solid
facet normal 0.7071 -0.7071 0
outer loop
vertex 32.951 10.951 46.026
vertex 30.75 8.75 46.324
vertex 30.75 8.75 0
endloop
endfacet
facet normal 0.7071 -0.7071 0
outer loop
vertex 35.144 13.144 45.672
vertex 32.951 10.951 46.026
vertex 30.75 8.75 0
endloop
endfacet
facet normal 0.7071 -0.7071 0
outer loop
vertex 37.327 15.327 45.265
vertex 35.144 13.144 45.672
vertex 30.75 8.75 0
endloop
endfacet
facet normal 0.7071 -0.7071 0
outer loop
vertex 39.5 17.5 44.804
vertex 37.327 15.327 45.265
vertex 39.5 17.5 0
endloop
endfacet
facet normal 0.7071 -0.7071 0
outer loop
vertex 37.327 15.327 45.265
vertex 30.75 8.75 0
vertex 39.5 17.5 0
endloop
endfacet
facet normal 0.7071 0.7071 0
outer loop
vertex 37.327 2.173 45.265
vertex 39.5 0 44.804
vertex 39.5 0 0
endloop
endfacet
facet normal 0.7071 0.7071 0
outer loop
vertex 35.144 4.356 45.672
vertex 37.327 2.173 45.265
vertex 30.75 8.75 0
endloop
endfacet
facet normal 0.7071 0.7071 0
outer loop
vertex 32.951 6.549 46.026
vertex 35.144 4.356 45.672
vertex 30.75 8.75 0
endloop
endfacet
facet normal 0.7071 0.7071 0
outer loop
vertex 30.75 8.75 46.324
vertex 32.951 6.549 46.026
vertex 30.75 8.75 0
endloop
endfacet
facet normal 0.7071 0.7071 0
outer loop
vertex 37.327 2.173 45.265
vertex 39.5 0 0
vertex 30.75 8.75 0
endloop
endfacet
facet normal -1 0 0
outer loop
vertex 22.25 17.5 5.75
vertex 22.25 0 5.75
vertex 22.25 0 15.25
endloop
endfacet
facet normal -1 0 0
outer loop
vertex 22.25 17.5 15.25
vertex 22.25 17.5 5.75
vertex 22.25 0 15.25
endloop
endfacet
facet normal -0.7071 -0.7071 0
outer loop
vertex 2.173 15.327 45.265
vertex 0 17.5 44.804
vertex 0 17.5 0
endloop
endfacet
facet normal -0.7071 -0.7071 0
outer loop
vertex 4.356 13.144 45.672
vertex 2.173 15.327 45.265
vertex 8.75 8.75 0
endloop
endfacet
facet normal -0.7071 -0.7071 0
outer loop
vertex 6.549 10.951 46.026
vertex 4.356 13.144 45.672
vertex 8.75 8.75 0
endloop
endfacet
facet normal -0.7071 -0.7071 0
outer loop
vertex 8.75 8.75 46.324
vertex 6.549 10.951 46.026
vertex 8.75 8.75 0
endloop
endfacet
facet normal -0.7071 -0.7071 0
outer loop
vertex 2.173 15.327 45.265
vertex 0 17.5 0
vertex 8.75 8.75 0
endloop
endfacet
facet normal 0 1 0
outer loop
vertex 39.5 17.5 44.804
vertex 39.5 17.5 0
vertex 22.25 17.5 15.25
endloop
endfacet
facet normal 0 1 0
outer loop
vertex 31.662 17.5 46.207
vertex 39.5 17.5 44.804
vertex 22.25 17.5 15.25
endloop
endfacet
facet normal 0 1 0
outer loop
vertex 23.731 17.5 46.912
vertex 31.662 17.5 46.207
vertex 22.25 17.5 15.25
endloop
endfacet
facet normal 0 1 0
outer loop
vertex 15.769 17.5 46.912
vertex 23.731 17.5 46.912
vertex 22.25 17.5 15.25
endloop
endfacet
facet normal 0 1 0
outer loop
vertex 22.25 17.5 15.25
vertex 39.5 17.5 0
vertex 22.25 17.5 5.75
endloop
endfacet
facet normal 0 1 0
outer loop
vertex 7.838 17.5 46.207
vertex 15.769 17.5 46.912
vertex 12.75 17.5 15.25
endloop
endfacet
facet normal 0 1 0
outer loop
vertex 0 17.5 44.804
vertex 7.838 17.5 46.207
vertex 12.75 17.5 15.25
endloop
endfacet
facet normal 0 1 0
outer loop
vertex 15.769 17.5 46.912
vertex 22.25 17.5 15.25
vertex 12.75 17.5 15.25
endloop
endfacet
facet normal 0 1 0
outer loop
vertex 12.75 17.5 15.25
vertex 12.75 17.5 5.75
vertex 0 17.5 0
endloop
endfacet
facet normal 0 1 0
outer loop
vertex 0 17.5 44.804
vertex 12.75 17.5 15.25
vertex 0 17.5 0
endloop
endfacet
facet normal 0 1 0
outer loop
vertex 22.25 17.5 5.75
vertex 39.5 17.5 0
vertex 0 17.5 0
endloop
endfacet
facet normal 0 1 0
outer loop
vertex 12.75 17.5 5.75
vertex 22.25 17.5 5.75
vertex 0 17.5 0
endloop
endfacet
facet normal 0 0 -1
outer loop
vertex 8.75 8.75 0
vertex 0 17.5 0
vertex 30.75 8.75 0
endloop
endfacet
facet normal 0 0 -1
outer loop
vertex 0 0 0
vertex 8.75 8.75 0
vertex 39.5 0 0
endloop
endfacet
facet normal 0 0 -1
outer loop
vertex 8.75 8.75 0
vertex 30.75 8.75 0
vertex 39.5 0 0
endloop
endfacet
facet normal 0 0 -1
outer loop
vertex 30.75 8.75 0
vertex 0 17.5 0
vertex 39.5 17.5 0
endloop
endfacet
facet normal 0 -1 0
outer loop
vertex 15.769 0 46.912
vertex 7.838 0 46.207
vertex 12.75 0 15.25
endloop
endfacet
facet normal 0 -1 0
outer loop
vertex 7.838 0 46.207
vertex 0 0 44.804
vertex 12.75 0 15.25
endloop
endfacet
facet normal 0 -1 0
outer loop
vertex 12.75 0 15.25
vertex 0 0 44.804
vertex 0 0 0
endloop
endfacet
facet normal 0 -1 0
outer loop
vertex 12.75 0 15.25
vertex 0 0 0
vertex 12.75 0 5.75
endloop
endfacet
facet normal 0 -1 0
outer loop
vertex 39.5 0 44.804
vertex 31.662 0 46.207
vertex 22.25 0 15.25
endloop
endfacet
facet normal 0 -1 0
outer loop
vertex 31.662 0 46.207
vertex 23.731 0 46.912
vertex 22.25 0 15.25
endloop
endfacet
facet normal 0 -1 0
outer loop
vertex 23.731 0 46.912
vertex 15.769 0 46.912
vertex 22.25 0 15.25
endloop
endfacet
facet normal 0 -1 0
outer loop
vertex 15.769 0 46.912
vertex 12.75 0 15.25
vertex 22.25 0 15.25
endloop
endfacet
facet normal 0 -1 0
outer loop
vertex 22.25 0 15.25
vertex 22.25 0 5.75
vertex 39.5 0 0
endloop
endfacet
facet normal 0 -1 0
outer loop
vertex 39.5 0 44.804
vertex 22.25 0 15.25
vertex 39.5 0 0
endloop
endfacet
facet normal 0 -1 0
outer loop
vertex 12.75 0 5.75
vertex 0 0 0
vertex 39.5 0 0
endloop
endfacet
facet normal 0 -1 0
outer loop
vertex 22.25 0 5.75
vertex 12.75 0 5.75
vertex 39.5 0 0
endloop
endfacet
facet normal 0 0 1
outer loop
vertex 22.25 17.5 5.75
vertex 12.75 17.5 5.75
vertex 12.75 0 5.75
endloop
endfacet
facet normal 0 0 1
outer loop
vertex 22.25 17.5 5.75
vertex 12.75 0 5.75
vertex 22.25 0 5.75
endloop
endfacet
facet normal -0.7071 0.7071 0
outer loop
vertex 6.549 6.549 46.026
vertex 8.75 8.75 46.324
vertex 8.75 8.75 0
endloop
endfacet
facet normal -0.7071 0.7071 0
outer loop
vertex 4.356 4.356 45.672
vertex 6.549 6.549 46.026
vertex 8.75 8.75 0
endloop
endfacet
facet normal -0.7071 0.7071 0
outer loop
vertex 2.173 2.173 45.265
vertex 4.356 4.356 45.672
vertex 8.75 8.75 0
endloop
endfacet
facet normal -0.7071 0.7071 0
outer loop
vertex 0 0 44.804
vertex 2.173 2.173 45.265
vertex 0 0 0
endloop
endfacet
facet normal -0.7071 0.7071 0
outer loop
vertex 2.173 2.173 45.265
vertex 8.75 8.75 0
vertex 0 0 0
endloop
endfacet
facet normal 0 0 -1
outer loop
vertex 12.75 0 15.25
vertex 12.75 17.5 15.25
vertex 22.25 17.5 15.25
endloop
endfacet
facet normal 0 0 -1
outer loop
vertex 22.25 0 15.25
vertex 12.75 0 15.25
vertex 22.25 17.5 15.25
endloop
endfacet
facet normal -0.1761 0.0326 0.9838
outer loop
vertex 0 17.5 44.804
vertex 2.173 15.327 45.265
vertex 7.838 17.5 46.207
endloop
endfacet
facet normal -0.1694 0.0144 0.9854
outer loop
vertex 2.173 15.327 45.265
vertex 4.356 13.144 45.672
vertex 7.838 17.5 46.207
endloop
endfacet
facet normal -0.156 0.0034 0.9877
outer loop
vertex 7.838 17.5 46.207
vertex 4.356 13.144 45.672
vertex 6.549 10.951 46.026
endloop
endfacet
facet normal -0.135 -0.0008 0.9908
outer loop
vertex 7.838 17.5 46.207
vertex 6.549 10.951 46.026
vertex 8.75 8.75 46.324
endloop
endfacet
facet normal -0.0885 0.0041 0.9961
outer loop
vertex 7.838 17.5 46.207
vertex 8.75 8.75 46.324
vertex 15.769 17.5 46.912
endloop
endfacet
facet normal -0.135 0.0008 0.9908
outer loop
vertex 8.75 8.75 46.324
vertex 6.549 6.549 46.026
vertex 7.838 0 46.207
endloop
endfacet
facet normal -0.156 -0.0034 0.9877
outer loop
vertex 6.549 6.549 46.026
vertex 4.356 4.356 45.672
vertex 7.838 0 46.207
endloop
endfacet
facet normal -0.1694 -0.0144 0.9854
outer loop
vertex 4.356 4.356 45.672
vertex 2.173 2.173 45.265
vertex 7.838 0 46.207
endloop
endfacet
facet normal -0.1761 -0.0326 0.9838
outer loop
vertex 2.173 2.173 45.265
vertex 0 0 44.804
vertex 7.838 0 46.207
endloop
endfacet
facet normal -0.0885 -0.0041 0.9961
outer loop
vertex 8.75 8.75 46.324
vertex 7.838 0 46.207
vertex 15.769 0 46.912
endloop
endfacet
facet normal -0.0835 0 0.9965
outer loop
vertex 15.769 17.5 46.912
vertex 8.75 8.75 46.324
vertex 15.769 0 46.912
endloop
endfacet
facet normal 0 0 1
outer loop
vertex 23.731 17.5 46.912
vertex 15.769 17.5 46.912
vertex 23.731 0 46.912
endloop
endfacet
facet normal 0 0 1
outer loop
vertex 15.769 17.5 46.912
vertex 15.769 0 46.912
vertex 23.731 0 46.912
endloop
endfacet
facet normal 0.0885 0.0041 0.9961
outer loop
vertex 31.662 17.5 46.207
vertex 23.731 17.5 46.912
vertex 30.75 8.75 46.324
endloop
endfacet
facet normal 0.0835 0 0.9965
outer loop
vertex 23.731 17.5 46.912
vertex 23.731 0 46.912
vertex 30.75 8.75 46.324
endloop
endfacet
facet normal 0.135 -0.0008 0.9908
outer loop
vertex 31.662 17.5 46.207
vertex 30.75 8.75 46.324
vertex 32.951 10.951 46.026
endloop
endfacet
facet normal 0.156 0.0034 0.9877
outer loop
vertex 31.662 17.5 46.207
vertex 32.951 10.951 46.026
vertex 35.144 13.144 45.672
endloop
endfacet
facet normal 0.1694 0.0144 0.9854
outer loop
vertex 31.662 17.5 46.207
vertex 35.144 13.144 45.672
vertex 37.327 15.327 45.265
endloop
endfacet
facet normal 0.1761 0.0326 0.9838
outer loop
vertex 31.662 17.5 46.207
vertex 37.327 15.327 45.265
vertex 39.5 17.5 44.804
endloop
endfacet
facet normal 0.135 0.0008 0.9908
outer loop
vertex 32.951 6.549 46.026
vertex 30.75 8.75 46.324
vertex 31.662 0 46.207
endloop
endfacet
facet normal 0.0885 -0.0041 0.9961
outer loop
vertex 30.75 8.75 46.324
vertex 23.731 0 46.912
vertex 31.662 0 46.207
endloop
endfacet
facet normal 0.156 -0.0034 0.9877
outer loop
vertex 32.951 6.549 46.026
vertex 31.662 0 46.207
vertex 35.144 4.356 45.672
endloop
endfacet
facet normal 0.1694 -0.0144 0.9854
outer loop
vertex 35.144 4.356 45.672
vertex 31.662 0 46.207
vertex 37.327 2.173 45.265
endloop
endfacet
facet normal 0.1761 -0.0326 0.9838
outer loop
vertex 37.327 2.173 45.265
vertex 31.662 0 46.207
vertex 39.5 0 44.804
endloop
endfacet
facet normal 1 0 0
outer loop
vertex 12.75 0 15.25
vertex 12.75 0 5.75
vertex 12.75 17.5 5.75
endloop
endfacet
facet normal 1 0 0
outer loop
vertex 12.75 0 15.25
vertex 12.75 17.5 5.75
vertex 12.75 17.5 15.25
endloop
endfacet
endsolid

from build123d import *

# Parameters (mm, degrees)
F1_DEPTH = 47
F3_DEPTH = 25
F4_W     = 9.5
F4_H     = 9.5
F5_DEPTH = 25


with BuildPart() as f1:
    # F0 (on Top) → F1 (new body)
    with BuildSketch(Plane.XY):
        Polygon((8.75, 8.75), (0, 0), (39.5, 0), (30.75, 8.75), (39.5, 17.5), (0, 17.5), align=None)
    extrude(amount=F1_DEPTH)

    # F2 (on face) → F3 (cut)
    with BuildSketch(Plane.XZ):
        with BuildLine():
            ThreePointArc((-5.643996, 43.338941), (18.362093, 46.989286), (42.469436, 44.081821))
            Line((42.469436, 44.081821), (45.143996, 47.1))
            Line((45.143996, 47.1), (-5.643996, 47.1))
            Line((-5.643996, 47.1), (-5.643996, 43.338941))
        make_face()
    extrude(amount=-F3_DEPTH, mode=Mode.SUBTRACT)

    # F4 (on face) → F5 (cut)
    with BuildSketch(Plane.XZ):
        with Locations((17.5, 10.5)):
            Rectangle(F4_W, F4_H)
    extrude(amount=-F5_DEPTH, mode=Mode.SUBTRACT)


solid = f1.part
